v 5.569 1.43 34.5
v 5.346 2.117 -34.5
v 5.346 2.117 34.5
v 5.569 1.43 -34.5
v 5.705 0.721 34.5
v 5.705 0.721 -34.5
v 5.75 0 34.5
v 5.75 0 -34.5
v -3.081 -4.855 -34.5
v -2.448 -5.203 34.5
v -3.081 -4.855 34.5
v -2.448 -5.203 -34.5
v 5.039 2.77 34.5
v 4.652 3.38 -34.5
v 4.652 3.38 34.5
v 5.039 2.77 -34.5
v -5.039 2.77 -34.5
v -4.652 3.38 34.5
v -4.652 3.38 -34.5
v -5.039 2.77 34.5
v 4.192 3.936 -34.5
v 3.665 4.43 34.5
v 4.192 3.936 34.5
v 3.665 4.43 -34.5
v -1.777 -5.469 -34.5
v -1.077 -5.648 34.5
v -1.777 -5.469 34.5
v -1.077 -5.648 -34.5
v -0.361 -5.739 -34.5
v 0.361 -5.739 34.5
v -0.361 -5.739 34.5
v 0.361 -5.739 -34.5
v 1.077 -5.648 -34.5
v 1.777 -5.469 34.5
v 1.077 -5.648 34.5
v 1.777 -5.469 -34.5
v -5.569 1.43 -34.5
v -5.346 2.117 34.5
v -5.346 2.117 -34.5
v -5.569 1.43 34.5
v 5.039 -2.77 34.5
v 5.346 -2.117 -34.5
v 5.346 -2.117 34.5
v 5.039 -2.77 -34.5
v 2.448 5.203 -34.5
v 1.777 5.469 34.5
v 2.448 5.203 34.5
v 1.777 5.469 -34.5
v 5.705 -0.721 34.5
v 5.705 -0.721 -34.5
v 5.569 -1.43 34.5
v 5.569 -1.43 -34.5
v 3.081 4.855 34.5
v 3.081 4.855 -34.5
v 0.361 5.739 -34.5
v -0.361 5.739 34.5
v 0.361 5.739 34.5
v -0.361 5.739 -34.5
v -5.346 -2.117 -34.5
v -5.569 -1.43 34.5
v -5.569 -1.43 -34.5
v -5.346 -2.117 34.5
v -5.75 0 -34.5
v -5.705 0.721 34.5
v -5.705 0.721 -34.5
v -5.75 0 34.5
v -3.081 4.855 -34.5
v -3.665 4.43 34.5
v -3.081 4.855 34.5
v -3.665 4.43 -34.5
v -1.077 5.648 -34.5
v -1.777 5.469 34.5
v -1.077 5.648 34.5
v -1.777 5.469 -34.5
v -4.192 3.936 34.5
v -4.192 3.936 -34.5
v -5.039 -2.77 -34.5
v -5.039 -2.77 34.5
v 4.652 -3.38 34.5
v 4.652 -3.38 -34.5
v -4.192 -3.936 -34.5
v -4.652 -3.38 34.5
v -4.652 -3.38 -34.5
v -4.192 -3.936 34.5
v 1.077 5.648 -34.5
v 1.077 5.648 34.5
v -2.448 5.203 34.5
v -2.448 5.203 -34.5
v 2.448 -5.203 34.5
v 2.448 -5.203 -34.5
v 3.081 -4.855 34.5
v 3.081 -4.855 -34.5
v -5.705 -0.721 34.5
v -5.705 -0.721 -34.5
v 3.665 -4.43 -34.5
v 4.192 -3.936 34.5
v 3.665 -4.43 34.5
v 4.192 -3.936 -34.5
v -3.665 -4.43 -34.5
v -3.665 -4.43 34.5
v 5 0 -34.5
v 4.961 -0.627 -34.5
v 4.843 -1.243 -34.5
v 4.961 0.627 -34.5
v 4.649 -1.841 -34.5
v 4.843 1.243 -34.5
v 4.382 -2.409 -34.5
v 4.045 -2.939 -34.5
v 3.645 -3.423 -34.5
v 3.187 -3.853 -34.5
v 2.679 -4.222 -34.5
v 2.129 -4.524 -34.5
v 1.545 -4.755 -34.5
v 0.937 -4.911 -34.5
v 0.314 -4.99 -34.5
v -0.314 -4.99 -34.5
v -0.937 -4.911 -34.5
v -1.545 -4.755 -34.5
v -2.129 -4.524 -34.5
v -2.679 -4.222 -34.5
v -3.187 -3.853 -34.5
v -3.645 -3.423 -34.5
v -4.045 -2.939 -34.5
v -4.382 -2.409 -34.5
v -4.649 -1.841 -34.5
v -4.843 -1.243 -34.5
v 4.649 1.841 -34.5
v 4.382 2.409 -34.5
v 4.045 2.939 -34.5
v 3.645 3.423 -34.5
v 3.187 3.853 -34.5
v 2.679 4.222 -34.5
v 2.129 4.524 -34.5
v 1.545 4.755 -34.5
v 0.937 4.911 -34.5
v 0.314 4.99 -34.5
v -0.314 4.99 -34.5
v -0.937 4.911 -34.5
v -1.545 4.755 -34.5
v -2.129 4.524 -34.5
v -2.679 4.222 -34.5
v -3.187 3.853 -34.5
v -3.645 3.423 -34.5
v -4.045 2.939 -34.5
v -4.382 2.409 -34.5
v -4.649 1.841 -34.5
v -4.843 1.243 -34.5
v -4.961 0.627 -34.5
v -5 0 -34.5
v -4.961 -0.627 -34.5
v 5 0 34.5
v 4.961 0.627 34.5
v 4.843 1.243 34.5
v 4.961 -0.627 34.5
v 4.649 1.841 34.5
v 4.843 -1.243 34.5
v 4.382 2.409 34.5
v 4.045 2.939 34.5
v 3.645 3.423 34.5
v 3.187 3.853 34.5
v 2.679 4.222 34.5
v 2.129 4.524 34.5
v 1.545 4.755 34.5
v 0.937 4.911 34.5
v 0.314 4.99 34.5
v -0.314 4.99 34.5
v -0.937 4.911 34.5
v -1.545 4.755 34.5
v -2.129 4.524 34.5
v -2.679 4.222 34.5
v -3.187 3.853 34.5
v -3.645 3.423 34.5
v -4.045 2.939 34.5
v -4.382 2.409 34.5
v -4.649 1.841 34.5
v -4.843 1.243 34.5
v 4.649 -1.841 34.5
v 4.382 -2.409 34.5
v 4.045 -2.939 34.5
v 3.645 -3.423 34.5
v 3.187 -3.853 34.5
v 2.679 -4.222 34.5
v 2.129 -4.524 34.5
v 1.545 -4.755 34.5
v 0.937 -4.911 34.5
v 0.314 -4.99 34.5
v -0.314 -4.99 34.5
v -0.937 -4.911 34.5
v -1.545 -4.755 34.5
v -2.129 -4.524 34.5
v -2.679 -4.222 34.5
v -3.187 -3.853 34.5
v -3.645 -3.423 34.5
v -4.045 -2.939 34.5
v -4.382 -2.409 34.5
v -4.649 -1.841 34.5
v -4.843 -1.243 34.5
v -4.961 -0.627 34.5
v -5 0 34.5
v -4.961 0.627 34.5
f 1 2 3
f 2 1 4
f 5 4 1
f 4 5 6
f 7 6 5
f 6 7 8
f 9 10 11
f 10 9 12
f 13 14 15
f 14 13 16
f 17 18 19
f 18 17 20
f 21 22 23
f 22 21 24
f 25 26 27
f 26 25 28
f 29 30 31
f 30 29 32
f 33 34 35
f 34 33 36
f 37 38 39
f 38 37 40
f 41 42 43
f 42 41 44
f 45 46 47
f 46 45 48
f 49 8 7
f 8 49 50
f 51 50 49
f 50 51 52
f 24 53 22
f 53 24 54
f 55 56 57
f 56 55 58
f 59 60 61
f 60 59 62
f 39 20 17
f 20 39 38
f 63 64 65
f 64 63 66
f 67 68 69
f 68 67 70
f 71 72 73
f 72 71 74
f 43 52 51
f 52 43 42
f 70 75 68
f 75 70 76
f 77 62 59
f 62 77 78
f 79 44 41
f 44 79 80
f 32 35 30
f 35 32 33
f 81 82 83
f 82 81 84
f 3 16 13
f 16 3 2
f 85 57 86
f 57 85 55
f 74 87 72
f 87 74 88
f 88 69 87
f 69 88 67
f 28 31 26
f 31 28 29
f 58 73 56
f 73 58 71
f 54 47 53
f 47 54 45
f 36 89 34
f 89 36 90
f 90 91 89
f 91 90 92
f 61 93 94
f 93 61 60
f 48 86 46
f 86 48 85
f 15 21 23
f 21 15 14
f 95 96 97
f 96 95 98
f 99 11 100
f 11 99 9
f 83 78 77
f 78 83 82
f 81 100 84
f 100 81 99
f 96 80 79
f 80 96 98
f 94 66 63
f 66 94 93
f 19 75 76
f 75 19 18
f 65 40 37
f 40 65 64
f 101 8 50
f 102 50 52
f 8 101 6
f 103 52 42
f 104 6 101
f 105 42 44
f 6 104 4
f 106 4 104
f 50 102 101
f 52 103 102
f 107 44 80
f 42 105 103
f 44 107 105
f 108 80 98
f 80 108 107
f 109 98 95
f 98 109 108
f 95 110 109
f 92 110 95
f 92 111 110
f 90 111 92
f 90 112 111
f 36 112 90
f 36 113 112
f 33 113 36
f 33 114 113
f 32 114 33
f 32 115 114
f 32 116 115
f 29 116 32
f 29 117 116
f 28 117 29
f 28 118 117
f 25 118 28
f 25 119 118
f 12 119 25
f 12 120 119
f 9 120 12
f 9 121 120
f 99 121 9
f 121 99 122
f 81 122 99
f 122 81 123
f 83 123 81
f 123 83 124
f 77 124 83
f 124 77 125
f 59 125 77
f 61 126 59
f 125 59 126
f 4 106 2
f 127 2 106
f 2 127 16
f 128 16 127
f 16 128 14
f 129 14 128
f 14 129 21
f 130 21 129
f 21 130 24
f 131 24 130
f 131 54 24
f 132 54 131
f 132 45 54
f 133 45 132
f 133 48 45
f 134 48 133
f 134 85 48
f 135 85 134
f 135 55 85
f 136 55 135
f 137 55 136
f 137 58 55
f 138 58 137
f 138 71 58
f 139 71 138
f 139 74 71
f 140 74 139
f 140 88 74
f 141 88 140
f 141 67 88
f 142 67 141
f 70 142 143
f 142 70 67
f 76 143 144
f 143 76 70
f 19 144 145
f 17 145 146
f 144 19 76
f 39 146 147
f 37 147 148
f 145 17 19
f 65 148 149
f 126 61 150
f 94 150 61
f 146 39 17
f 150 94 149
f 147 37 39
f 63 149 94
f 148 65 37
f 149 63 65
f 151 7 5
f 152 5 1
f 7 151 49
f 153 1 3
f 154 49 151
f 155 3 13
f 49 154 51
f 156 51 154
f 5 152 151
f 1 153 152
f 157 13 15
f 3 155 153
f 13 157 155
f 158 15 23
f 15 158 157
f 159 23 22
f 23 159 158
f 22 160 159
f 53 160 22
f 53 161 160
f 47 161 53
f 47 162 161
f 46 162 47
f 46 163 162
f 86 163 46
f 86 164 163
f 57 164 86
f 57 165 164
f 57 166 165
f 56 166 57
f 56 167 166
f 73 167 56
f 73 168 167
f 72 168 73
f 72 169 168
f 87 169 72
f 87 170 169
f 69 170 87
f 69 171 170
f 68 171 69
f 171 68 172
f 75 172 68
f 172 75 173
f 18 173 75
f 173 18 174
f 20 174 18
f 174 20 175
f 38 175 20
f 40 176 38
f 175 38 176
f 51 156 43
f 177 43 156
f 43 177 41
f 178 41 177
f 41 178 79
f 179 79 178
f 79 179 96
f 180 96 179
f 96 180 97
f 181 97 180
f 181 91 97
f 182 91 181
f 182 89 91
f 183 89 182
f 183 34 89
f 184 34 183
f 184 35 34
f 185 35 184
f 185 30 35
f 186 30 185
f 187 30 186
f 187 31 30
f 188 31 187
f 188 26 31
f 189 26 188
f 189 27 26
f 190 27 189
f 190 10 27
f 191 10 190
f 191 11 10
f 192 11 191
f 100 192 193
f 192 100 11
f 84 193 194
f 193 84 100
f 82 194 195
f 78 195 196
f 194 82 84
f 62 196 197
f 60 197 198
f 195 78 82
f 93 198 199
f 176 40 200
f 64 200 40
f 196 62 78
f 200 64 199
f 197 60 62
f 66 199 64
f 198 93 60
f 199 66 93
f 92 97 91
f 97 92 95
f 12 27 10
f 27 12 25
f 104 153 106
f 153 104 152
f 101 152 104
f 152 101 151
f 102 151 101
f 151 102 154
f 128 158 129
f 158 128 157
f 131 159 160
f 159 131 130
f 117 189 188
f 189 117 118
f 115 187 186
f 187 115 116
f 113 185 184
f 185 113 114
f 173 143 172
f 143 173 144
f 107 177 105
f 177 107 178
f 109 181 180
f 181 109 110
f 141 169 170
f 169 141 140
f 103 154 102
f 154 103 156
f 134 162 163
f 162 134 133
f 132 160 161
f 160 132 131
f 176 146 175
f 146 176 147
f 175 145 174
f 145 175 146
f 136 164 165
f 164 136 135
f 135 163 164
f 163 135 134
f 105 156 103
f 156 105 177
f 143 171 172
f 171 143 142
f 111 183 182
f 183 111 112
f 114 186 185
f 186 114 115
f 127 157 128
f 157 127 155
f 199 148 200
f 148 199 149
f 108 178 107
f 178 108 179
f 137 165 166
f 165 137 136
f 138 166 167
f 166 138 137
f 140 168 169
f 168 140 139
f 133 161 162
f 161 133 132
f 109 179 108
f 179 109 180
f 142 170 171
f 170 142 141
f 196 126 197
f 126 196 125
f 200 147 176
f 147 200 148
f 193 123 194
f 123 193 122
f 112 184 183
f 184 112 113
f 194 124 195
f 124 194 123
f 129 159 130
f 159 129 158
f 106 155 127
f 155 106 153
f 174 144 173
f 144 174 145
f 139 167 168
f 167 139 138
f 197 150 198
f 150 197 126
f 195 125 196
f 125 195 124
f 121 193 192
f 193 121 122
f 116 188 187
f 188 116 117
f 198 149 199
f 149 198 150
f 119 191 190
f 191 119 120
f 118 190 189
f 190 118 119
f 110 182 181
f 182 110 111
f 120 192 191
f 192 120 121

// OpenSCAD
$fn = 50;


difference() {
	union() {
		translate(v = [0, 0, -34.5000000000]) {
			cylinder(h = 69, r = 5.7500000000);
		}
	}
	union() {
		translate(v = [0, 0, -100.0000000000]) {
			cylinder(h = 200, r = 5.0000000000);
		}
	}
}
